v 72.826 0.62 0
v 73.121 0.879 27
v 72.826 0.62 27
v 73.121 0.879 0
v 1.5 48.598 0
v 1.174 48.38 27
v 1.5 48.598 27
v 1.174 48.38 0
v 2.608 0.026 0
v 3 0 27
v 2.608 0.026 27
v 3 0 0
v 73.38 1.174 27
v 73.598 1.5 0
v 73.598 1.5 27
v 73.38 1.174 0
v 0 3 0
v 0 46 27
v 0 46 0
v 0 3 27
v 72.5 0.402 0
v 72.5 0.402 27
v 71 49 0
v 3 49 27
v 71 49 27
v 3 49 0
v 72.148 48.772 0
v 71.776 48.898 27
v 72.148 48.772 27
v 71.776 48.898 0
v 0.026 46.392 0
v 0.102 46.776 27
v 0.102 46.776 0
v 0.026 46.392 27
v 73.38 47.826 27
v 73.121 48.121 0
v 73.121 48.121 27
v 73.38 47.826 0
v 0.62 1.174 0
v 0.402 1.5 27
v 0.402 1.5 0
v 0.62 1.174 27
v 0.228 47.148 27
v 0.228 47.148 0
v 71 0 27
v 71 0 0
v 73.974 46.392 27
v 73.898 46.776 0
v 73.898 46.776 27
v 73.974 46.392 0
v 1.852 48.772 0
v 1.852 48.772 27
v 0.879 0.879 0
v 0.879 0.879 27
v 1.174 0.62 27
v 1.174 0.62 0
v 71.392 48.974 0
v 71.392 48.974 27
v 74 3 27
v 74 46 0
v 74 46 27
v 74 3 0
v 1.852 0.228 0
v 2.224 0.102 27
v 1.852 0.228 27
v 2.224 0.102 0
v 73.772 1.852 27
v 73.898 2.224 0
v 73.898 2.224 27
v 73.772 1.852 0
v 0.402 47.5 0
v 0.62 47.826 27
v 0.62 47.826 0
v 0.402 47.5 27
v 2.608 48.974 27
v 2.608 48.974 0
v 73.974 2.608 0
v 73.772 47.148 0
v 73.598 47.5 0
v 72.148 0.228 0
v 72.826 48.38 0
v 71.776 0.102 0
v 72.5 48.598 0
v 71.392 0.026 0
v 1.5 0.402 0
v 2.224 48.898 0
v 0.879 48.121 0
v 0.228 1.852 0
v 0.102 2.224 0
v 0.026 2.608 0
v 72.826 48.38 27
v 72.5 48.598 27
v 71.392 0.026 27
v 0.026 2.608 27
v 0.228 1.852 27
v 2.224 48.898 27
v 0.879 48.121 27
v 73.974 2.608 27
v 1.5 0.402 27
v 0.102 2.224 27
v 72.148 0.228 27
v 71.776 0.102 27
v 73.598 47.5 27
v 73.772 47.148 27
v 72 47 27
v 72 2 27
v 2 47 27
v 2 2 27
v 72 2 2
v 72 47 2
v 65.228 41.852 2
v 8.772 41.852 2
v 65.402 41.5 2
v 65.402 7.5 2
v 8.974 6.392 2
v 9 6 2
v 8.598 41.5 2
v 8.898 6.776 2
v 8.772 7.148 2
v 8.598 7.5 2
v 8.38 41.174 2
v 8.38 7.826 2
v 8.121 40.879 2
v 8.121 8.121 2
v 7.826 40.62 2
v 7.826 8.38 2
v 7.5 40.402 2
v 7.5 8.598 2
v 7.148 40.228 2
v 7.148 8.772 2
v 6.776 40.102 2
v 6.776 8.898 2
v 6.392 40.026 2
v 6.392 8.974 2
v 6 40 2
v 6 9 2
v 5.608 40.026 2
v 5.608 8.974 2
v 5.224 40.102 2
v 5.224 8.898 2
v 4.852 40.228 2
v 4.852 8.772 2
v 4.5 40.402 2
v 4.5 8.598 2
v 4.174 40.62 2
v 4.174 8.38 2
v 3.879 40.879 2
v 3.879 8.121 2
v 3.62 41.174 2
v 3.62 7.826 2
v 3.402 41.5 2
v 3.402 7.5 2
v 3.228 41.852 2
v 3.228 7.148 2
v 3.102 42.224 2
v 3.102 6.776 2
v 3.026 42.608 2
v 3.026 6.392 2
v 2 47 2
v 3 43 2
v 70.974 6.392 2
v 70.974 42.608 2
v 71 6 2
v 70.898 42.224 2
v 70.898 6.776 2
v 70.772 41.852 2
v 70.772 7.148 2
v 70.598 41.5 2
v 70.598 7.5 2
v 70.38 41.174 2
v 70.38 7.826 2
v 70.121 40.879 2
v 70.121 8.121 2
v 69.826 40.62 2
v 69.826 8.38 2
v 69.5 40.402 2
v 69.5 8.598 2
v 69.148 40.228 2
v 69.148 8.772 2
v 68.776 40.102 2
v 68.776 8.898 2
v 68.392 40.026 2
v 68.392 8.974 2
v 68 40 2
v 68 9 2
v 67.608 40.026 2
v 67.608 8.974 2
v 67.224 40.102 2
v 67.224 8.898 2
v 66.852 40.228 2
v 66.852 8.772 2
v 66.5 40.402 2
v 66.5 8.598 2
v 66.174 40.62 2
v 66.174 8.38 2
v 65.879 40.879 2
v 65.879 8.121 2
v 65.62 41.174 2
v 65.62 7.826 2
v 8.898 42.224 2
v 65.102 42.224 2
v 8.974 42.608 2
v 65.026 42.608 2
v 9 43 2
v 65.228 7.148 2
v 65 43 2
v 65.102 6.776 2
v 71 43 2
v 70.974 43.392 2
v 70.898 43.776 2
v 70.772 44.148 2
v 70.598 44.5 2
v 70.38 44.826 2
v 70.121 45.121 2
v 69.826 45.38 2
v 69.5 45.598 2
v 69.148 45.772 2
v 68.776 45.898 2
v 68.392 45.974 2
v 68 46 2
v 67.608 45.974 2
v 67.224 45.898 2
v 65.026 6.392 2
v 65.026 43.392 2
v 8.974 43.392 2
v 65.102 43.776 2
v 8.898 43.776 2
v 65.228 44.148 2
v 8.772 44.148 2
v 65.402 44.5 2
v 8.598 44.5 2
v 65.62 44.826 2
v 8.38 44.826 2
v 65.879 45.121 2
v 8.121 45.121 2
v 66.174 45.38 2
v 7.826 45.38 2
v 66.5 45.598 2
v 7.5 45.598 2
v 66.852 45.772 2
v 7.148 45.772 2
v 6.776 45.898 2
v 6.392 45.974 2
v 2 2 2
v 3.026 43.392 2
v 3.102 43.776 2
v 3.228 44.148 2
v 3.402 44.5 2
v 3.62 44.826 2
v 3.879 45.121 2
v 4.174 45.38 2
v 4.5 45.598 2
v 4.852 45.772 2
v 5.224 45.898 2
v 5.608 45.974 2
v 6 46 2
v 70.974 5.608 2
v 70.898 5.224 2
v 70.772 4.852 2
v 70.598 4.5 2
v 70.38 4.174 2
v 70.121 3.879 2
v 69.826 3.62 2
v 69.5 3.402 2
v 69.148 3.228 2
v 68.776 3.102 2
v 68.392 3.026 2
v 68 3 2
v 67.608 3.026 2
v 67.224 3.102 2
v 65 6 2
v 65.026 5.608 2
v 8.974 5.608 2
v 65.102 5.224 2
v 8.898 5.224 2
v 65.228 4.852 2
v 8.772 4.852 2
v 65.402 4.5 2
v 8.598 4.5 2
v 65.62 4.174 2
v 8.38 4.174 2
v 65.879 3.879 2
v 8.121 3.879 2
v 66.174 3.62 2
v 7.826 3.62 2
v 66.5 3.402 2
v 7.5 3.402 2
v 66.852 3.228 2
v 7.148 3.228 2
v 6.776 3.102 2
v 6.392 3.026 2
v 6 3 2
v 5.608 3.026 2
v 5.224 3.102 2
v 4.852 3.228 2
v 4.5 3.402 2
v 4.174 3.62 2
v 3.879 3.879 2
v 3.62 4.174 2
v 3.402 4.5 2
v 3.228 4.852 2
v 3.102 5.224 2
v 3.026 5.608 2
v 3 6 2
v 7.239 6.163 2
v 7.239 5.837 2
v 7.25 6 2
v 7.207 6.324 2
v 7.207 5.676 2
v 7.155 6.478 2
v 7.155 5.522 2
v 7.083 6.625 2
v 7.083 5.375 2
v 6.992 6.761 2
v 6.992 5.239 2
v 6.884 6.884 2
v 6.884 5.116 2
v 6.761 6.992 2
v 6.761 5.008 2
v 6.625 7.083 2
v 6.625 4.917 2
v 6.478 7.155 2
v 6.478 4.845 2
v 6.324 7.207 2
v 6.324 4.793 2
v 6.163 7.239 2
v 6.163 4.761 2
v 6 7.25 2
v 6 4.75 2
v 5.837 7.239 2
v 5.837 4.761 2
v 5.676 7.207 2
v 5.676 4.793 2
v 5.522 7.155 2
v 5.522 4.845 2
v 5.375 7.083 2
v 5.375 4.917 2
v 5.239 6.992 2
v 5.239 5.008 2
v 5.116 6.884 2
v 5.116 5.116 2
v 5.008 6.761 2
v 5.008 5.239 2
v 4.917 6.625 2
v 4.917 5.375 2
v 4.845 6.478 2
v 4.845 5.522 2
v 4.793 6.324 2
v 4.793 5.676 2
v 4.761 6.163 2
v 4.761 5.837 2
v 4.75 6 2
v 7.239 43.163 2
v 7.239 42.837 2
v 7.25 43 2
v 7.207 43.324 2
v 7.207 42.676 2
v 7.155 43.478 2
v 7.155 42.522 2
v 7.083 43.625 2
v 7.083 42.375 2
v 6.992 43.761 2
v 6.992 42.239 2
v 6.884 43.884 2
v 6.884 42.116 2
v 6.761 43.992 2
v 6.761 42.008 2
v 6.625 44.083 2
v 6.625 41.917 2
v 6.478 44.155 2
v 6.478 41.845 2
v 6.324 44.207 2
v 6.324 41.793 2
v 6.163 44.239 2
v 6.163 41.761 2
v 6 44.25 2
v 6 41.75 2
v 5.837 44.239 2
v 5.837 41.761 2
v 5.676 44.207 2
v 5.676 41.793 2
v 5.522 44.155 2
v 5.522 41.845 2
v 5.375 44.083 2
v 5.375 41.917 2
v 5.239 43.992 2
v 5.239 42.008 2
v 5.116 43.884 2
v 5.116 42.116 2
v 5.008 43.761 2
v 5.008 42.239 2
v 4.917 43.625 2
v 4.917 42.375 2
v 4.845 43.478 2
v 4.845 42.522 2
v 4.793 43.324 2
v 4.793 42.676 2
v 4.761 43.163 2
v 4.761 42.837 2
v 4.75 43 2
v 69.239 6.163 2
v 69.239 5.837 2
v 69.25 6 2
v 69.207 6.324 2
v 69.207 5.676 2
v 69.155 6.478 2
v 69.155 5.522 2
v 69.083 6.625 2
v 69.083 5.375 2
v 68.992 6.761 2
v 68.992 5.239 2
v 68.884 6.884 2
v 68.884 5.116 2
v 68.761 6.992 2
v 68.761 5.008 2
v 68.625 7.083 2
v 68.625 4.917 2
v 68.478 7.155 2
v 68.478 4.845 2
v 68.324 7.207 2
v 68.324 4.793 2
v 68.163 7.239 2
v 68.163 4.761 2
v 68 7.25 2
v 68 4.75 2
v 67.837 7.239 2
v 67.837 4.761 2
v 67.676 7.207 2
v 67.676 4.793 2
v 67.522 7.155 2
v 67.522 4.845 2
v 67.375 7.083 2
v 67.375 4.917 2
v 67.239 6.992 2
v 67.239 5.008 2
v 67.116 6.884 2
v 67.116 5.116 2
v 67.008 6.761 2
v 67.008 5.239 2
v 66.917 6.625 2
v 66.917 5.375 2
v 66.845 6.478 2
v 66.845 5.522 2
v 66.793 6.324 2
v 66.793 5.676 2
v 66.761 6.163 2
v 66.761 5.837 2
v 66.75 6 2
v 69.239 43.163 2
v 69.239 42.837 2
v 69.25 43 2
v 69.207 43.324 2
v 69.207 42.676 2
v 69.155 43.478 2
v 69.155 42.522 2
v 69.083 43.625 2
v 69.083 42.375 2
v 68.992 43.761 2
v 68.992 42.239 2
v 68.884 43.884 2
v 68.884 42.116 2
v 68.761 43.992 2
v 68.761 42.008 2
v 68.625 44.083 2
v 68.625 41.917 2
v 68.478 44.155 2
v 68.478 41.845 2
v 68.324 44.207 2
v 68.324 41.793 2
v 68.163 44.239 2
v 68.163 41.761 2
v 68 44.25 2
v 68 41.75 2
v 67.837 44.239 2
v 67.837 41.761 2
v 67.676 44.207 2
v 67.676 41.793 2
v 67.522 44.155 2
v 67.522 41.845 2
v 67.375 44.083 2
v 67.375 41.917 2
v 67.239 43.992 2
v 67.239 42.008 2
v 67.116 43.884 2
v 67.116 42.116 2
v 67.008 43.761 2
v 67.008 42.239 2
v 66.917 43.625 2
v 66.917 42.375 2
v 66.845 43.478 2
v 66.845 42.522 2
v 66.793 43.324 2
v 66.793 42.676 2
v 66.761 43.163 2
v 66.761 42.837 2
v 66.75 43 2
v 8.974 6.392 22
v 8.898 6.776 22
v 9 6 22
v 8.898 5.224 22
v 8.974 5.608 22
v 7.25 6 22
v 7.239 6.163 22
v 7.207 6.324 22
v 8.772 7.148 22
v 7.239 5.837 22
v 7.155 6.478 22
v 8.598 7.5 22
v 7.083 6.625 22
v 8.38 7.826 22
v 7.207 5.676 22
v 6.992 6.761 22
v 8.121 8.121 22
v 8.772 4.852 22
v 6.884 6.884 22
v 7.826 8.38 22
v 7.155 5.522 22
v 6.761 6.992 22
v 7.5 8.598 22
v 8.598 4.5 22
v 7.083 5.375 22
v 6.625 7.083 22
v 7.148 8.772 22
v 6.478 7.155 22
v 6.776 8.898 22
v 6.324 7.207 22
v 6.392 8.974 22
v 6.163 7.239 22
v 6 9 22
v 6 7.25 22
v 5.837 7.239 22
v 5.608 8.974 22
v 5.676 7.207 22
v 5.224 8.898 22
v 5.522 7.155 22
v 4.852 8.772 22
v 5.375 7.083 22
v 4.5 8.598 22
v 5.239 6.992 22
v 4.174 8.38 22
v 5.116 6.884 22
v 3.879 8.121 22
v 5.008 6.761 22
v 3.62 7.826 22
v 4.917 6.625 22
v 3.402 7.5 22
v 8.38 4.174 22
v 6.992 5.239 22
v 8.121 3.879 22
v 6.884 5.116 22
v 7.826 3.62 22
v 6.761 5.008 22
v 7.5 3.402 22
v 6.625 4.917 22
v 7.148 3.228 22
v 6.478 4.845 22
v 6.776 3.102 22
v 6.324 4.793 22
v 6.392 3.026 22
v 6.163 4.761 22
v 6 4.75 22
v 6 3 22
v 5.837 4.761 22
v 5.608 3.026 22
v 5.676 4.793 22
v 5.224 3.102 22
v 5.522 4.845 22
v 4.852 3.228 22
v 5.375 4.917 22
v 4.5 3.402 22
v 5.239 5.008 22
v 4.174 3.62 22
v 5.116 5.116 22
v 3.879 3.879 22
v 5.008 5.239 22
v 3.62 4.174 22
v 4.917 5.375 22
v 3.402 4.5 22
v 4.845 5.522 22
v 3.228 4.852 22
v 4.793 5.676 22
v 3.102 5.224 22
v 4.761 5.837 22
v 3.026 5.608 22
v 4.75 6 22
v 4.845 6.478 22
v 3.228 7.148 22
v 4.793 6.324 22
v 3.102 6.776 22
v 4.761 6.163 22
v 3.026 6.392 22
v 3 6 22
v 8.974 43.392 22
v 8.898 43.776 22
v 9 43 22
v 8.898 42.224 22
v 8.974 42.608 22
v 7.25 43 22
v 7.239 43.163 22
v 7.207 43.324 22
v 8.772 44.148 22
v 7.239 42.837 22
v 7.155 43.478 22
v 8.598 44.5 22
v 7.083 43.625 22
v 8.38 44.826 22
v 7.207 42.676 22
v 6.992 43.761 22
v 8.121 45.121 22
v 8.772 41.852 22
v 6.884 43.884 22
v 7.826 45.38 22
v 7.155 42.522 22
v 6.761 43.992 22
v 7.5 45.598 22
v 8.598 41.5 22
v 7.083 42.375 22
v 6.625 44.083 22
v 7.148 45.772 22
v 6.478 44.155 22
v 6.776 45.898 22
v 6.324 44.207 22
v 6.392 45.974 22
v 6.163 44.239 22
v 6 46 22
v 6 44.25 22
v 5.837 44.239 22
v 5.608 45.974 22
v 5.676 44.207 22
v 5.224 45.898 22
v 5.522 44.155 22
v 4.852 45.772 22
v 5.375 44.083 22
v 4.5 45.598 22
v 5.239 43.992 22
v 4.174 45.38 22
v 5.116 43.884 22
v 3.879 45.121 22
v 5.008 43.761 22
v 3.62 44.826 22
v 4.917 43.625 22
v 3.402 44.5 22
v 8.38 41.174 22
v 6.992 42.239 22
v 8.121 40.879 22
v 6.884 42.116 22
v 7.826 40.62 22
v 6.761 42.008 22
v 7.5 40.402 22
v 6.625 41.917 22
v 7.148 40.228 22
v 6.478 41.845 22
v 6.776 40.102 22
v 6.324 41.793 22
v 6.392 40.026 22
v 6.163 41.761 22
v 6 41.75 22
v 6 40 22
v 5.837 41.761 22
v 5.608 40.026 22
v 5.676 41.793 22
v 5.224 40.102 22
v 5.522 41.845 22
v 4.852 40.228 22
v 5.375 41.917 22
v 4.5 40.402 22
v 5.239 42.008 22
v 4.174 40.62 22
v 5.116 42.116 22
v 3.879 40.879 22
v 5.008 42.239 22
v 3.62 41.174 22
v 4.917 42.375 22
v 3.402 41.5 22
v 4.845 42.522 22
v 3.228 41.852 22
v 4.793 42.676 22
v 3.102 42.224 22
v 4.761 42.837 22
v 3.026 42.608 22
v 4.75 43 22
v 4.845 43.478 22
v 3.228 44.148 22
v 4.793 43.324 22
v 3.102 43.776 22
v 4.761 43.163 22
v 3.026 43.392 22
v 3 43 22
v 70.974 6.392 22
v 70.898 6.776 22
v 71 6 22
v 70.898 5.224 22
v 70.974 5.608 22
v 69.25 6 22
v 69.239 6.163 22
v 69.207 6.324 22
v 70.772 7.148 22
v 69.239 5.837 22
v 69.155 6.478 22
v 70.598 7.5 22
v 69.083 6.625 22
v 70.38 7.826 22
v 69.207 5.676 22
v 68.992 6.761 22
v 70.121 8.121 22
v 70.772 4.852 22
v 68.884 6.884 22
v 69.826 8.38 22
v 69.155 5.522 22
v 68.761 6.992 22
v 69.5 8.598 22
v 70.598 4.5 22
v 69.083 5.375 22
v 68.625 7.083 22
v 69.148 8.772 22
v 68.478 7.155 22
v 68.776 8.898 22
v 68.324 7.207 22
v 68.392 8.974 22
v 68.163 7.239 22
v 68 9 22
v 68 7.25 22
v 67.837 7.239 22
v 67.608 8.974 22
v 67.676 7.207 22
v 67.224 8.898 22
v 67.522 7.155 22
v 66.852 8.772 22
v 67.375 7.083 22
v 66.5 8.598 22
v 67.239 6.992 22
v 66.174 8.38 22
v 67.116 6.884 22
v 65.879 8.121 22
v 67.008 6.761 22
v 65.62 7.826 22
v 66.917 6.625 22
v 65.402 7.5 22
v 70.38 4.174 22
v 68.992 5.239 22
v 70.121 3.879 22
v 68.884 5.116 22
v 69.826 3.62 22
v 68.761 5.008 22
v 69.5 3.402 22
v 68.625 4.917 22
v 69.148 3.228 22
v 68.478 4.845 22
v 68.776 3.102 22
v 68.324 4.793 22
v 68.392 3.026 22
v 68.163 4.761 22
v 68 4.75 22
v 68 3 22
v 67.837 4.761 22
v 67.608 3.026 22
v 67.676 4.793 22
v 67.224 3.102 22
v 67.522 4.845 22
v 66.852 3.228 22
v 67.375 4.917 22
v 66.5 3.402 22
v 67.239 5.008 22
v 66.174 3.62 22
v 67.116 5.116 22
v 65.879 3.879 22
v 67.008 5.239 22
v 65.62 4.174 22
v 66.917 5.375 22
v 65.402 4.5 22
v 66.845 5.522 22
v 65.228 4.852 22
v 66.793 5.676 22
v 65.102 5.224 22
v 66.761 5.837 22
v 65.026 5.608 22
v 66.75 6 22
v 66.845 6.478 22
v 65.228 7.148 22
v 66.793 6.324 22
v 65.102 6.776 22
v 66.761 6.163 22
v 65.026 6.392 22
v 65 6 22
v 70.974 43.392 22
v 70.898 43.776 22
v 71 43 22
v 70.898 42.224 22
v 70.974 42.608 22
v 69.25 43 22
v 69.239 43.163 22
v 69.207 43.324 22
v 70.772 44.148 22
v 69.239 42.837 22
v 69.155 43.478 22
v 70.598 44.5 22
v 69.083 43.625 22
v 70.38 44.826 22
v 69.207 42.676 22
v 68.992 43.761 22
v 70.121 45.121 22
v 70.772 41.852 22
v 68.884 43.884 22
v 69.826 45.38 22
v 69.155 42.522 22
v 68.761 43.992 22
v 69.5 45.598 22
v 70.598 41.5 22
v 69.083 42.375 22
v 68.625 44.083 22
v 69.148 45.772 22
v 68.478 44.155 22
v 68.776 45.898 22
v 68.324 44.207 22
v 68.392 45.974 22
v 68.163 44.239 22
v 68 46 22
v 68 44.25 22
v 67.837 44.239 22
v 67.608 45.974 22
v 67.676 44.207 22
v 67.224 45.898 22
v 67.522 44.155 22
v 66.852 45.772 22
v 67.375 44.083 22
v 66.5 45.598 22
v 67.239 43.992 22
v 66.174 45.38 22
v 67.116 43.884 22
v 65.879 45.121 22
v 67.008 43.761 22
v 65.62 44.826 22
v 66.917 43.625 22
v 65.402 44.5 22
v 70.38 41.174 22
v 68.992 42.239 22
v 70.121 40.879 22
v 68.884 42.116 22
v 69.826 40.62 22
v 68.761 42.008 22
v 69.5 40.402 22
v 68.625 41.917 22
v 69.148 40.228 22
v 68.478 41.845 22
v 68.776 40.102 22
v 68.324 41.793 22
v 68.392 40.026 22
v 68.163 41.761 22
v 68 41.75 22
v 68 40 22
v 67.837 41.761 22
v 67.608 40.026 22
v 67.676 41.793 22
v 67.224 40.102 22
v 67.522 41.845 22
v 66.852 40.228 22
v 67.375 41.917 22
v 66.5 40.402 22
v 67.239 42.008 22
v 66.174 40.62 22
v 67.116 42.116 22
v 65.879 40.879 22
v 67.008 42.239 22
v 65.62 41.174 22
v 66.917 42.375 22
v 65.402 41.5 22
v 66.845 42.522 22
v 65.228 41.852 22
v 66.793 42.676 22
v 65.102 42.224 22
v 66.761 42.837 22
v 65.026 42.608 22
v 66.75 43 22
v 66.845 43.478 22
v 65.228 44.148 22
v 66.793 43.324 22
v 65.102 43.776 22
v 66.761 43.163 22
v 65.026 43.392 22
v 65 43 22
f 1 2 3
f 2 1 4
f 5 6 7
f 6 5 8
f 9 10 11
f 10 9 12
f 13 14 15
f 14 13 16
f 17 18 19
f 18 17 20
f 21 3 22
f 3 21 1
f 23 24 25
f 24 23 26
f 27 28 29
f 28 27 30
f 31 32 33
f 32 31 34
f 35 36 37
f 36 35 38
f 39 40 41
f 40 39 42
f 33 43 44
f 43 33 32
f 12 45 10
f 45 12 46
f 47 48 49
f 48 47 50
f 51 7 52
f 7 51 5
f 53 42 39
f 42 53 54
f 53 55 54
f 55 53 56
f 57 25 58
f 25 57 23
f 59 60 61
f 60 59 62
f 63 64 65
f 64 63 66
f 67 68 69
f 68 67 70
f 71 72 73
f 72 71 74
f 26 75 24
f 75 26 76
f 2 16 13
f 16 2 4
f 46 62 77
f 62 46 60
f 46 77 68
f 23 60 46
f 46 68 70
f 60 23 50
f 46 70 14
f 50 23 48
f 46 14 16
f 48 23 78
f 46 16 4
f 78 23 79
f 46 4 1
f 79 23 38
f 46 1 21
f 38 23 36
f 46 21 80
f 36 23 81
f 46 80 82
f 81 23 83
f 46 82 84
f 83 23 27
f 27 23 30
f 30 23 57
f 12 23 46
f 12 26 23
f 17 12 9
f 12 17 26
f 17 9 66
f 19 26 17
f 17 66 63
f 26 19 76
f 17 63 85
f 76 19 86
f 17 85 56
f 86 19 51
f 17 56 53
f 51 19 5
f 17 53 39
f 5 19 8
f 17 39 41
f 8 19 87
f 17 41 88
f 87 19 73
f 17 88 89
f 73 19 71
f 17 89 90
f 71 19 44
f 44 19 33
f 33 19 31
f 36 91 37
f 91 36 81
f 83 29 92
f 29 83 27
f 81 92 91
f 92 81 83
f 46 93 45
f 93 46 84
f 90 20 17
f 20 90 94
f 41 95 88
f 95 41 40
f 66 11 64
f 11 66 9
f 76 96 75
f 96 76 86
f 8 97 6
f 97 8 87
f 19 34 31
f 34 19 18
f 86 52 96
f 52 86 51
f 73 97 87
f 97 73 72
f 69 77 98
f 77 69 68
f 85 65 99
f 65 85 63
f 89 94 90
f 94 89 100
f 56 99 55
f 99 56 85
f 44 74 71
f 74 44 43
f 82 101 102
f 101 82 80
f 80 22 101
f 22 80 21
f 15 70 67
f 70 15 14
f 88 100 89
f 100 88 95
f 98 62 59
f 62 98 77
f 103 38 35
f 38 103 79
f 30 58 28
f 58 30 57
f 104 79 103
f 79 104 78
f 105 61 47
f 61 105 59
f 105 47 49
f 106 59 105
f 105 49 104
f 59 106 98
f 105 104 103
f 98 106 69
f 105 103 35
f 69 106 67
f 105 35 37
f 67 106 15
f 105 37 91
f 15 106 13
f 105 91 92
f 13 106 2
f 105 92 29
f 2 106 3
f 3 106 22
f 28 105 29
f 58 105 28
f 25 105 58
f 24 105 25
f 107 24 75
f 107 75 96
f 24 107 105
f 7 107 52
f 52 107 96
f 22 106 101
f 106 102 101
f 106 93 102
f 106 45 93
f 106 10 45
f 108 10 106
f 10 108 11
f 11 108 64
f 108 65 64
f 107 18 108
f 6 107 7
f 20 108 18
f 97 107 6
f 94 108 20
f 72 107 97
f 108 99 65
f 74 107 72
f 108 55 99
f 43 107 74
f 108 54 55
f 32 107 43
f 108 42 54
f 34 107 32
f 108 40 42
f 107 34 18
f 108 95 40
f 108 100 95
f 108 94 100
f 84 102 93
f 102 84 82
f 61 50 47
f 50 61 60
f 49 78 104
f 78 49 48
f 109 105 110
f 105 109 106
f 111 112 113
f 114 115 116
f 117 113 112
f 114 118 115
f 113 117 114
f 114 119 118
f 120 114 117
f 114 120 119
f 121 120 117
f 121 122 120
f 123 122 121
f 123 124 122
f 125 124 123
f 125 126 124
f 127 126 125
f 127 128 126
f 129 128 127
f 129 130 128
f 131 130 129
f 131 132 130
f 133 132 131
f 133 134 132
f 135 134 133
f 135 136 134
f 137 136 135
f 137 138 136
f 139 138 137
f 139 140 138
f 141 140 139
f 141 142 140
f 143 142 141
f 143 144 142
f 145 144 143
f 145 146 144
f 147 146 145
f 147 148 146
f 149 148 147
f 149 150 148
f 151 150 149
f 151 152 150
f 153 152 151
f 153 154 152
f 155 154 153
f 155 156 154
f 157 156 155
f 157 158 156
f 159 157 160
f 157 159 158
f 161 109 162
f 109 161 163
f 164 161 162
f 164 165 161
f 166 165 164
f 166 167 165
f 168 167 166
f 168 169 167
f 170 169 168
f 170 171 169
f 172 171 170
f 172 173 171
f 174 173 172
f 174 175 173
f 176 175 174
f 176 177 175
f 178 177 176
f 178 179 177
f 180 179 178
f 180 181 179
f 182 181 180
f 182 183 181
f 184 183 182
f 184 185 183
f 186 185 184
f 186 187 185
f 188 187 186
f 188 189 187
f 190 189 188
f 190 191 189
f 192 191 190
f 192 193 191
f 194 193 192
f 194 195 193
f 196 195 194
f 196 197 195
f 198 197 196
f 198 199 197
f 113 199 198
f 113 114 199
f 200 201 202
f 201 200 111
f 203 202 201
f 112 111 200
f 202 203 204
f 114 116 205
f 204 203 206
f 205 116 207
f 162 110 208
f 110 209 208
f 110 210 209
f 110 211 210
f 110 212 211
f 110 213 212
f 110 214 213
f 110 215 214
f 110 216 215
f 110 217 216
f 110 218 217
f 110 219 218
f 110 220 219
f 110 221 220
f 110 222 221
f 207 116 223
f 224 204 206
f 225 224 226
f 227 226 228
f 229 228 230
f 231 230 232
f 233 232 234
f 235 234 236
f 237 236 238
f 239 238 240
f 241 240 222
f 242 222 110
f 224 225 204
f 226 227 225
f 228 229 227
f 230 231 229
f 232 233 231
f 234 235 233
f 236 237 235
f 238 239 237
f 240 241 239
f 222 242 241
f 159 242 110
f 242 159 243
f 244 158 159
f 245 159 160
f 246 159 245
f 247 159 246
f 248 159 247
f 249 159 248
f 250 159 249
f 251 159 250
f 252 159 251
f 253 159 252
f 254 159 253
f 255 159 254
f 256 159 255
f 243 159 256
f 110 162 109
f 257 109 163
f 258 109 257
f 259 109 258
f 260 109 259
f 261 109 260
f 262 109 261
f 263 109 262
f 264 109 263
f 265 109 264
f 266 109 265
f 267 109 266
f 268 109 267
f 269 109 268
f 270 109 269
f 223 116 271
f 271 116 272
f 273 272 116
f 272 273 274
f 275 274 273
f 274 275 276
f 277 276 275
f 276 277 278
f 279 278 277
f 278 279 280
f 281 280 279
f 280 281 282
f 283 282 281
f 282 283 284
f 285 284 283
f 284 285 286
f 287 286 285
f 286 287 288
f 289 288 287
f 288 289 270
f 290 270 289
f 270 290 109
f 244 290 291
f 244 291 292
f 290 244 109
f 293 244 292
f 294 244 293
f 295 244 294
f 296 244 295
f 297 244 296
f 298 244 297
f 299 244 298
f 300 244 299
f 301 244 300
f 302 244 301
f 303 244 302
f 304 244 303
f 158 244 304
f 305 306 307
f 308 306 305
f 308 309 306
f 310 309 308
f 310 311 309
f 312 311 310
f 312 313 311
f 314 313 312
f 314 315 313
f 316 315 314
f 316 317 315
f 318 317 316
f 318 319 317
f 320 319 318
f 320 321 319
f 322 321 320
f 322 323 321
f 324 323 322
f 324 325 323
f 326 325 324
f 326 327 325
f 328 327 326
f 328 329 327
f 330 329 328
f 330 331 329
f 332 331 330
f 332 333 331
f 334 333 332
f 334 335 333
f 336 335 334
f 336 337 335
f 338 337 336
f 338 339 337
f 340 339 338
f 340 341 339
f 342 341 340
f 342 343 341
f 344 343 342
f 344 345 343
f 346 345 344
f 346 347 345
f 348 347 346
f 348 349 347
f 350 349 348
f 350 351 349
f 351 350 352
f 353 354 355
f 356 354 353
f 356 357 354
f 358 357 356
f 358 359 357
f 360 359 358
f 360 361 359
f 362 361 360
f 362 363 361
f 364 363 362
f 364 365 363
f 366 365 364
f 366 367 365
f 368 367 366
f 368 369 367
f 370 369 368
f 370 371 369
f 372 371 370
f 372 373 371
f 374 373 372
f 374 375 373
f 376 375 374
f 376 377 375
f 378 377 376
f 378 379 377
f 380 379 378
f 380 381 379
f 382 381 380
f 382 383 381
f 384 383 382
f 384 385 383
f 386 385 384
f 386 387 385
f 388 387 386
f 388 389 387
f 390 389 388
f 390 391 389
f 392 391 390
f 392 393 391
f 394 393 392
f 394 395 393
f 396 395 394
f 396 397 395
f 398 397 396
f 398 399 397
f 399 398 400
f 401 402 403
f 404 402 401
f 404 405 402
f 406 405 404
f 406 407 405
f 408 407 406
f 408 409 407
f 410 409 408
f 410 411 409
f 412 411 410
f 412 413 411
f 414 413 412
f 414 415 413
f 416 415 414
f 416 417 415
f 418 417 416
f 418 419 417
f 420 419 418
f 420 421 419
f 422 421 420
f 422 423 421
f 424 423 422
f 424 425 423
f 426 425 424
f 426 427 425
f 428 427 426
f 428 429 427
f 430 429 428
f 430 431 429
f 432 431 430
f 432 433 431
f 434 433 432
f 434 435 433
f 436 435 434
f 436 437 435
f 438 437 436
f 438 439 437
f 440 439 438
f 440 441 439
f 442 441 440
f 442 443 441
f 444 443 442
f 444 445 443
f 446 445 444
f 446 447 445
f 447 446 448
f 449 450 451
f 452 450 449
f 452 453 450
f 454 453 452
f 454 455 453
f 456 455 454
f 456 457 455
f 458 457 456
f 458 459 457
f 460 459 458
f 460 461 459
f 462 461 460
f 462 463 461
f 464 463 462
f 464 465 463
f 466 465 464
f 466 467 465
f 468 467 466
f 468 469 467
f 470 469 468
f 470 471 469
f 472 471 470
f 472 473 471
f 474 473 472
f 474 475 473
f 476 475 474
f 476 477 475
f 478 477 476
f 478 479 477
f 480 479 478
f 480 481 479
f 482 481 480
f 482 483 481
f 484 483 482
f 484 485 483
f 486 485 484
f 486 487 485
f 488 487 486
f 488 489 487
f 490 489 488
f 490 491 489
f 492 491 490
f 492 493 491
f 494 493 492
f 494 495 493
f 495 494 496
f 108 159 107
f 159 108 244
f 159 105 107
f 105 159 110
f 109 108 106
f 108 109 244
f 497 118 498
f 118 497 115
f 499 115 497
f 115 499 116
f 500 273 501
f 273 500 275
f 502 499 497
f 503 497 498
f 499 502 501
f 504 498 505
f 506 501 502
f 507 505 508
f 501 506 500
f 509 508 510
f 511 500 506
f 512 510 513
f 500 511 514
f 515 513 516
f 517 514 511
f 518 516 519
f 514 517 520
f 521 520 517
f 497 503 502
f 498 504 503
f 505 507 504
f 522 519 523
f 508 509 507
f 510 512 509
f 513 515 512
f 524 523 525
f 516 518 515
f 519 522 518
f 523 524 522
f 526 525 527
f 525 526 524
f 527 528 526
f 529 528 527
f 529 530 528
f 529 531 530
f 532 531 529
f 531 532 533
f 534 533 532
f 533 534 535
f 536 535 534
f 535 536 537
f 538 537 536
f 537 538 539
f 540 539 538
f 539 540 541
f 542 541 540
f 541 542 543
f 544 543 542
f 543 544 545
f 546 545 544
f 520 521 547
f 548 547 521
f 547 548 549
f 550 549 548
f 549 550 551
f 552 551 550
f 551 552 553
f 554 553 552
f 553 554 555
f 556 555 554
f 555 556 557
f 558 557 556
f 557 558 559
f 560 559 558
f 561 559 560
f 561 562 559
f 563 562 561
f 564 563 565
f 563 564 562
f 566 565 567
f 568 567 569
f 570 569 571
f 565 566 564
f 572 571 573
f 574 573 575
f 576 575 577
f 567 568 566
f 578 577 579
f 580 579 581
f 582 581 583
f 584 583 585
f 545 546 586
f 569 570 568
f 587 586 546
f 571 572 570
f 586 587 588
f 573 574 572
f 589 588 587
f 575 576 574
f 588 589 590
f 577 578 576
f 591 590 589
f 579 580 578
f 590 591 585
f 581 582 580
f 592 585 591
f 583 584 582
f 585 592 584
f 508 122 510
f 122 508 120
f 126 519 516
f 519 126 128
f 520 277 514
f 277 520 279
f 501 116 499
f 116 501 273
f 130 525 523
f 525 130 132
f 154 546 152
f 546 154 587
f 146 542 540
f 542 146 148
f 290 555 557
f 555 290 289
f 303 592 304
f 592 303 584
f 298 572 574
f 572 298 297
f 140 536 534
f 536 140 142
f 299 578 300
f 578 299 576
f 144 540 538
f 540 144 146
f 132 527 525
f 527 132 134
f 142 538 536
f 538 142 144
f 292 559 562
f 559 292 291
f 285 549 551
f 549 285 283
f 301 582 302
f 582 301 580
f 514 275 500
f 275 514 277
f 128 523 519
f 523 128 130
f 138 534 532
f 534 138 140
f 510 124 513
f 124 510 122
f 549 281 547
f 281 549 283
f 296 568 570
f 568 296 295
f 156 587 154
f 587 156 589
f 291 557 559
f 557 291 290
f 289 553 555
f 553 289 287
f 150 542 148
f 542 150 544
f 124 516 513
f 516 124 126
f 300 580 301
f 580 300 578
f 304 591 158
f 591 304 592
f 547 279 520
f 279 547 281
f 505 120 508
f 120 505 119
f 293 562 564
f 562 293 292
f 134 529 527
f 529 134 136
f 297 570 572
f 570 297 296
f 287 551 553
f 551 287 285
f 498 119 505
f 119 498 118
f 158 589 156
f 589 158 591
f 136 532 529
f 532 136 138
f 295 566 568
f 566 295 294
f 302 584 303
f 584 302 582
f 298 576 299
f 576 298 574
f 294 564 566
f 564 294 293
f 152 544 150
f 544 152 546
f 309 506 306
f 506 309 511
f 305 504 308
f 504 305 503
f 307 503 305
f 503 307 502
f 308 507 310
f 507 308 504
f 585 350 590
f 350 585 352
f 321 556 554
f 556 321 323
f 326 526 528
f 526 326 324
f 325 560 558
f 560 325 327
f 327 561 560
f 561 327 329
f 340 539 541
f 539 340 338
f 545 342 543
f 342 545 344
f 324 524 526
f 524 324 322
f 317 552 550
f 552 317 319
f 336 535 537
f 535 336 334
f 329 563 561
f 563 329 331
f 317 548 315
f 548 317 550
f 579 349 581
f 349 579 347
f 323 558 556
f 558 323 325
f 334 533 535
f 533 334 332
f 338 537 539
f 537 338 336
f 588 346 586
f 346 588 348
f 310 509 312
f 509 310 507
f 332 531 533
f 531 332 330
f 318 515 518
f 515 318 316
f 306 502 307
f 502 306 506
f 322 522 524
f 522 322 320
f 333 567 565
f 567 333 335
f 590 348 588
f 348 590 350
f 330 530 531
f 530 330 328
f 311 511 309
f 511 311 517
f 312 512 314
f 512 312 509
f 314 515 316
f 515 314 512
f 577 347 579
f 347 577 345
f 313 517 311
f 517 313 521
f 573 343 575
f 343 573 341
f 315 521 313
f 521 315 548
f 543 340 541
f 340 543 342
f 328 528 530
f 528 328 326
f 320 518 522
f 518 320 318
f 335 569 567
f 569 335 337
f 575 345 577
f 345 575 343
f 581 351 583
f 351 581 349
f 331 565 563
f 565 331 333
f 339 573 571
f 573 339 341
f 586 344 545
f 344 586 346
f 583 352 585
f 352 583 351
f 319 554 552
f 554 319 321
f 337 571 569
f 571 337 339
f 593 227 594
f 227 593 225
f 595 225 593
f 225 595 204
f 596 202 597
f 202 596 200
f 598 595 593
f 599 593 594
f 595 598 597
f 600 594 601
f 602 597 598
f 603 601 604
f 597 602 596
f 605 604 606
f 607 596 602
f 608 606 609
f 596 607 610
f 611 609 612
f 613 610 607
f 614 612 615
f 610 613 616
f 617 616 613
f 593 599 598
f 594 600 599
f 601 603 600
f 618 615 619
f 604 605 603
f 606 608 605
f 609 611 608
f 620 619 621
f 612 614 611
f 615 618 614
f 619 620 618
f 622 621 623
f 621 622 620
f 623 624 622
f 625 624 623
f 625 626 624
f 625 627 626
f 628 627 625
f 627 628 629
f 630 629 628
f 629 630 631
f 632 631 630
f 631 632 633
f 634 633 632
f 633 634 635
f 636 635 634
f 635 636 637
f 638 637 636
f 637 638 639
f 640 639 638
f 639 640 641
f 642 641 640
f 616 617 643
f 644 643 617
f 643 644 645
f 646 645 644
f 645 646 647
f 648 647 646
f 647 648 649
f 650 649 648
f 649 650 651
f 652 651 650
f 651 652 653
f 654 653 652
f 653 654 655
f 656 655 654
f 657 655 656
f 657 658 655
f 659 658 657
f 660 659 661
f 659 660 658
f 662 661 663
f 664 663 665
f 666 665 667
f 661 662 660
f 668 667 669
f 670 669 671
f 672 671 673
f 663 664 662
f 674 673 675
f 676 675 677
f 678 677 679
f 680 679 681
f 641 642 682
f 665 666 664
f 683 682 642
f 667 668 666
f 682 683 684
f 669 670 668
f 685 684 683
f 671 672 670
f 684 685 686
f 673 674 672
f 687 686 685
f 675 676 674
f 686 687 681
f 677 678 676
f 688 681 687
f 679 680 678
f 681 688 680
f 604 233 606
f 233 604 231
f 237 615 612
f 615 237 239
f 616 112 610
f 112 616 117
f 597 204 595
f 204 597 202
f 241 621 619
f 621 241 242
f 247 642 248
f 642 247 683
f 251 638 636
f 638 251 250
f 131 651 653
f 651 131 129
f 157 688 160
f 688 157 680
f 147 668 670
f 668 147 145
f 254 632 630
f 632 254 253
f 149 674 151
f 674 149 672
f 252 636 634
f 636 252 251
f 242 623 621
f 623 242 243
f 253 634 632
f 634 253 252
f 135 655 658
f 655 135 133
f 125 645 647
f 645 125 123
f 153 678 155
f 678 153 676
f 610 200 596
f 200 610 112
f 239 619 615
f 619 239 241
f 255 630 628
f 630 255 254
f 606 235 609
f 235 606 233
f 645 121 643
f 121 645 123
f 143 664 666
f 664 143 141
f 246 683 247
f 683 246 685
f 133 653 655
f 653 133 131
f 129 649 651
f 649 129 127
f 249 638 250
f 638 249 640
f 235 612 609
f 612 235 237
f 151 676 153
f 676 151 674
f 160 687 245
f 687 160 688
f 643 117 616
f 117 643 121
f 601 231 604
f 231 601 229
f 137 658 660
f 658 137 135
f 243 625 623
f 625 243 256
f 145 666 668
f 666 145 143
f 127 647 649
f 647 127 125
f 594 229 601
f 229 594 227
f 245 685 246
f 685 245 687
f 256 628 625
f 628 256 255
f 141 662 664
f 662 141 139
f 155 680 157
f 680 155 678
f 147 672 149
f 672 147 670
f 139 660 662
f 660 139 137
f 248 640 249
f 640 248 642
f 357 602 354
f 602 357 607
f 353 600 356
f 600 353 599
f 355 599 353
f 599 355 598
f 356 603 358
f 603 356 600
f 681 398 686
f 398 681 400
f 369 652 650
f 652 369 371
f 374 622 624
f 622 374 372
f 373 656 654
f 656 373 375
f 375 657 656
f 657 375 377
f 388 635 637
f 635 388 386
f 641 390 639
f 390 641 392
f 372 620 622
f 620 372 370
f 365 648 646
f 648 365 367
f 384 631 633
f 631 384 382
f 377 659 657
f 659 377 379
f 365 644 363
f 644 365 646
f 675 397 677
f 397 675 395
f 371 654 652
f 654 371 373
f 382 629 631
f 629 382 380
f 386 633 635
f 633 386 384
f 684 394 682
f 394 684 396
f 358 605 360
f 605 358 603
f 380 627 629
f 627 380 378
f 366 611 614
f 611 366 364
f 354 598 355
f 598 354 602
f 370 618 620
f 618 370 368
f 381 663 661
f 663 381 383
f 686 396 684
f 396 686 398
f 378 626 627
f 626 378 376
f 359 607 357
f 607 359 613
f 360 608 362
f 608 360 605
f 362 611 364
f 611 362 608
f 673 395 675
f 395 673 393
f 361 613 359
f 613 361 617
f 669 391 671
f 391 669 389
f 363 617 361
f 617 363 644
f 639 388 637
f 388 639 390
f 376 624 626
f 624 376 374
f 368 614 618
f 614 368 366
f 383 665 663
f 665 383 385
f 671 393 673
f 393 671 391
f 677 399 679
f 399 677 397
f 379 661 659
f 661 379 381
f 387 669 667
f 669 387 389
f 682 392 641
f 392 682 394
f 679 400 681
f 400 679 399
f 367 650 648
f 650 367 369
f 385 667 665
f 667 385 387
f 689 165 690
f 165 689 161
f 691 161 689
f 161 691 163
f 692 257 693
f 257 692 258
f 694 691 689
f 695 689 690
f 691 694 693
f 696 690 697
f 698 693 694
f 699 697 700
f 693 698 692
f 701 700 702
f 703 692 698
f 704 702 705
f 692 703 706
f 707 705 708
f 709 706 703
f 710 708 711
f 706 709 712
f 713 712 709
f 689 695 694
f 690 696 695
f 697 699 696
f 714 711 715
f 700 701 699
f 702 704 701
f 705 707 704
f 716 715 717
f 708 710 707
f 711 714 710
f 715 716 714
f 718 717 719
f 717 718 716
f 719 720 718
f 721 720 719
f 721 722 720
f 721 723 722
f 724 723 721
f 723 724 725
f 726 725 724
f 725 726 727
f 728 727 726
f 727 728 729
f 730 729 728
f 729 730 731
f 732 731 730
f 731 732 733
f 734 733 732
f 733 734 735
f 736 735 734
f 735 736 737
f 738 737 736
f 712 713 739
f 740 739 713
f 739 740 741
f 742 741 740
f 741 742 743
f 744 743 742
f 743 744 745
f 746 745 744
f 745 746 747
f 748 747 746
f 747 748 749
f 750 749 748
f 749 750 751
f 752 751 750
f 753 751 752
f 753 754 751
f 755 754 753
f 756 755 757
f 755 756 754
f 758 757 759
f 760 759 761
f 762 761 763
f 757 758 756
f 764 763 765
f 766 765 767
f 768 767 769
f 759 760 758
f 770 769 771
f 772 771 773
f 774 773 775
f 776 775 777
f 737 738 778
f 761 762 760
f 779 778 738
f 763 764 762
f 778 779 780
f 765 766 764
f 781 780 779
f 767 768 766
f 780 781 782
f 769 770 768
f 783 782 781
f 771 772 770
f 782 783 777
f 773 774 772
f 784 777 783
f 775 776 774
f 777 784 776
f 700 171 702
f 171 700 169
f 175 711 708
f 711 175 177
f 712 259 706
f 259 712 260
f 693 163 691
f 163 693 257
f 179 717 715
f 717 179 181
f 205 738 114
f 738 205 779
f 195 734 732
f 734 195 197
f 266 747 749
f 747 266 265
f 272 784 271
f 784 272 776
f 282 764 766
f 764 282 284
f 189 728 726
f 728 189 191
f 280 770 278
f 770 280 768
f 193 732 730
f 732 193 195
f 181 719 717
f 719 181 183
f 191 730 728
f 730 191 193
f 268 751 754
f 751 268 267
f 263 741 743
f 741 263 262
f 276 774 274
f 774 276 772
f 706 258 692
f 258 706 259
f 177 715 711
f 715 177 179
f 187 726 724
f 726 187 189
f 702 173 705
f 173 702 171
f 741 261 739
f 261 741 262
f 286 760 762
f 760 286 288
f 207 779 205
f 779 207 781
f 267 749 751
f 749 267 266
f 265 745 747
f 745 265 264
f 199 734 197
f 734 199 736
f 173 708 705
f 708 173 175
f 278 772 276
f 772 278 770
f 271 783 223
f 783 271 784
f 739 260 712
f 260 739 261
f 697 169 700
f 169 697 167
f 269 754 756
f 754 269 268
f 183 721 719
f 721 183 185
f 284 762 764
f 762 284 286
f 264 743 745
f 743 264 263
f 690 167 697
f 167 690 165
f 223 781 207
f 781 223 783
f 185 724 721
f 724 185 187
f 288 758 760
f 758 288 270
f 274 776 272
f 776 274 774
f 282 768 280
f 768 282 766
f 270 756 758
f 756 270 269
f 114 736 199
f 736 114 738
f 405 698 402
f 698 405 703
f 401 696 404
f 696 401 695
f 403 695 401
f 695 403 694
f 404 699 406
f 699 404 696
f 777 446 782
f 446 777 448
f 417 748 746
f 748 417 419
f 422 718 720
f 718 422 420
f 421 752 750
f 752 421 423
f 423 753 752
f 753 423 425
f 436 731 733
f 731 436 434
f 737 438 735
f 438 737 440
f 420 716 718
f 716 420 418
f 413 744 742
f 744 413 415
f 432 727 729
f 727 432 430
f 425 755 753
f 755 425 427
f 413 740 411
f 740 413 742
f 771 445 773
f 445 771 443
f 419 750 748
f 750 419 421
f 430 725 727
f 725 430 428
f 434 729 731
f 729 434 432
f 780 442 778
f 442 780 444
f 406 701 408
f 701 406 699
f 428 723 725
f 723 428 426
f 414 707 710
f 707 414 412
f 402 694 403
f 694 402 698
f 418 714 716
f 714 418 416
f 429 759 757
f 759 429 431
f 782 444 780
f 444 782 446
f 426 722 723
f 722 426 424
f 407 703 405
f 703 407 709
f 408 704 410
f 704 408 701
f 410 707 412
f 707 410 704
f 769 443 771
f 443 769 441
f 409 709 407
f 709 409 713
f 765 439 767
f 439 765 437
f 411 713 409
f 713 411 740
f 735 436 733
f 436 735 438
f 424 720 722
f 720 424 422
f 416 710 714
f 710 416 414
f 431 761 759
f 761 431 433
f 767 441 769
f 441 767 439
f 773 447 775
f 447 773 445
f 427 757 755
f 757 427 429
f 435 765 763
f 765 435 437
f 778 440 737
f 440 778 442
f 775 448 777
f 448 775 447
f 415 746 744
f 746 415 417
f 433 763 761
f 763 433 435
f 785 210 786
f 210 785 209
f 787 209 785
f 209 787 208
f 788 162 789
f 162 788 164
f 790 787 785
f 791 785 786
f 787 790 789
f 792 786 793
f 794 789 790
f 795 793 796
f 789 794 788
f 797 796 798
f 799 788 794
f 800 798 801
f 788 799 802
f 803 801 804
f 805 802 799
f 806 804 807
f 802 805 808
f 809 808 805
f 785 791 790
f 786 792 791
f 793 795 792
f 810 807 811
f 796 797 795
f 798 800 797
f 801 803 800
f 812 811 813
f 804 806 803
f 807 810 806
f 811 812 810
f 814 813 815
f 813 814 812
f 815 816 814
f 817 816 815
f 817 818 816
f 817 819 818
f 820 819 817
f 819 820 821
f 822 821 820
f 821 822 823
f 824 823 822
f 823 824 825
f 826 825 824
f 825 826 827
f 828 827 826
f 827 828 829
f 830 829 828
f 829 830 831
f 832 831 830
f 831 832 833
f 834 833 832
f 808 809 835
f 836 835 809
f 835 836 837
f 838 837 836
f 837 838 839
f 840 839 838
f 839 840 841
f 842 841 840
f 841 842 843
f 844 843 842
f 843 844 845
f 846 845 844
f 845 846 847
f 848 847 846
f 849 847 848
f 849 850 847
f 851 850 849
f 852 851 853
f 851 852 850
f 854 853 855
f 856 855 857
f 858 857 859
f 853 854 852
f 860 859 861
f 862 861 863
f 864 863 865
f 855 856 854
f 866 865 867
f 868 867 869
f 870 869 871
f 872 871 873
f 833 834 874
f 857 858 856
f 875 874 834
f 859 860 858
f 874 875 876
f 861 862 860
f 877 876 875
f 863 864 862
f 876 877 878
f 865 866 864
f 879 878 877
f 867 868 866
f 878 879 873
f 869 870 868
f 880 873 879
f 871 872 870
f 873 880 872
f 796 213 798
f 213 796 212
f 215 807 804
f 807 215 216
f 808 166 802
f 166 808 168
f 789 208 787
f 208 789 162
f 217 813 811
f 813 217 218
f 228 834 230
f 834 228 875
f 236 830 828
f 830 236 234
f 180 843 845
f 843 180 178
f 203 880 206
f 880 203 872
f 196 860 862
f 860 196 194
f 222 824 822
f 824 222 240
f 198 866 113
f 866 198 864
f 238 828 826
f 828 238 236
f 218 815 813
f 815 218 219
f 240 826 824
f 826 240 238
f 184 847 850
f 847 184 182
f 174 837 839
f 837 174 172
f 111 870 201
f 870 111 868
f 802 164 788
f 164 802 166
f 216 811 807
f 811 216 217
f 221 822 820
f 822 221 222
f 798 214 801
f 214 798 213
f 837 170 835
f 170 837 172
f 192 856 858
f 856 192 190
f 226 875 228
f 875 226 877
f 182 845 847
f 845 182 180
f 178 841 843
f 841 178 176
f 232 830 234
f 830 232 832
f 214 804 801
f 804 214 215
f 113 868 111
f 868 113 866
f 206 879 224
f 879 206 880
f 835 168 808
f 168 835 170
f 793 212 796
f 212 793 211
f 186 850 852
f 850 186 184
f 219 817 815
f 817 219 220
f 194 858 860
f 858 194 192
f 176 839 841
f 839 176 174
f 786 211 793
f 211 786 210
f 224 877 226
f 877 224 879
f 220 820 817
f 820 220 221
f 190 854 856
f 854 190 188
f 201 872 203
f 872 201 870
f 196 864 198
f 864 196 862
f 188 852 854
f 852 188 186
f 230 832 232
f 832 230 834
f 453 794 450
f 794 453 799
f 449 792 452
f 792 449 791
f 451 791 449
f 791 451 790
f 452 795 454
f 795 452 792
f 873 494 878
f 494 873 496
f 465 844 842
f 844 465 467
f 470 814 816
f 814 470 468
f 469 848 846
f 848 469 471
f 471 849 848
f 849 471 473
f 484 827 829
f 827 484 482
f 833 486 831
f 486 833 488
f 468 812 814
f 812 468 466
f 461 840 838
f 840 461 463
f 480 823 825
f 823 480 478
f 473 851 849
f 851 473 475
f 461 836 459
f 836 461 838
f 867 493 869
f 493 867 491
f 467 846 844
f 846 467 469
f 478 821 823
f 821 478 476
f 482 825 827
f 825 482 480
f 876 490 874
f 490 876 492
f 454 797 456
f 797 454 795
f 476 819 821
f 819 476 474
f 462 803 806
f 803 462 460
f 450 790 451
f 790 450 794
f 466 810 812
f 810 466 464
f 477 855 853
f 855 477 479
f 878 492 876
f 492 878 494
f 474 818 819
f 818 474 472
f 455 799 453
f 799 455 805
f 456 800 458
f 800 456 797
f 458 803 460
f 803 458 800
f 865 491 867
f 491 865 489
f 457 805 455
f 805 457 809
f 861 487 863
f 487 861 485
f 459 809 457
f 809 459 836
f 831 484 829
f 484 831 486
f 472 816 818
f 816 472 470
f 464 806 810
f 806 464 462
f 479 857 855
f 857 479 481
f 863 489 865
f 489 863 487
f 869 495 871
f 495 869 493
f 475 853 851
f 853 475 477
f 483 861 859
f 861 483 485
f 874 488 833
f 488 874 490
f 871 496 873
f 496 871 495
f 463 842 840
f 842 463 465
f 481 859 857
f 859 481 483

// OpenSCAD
// Parametric electronics enclosure with screw posts and a snap lid
/* [Inside dimensions] */
inner_x = 70;   // [20:200]
inner_y = 45;   // [20:200]
inner_z = 25;   // [10:100]
/* [Walls] */
wall = 2;       // [1:0.2:5]
floor_t = 2;    // [1:0.2:5]
corner_r = 3;   // [0:0.5:10]
/* [Screw posts] */
post_d = 6;     // [4:0.5:12]
screw_d = 2.5;  // [1.5:0.1:5]
post_inset = 4; // [3:15]
/* [Hidden] */
$fn = 48;
eps = 0.01;

outer = [inner_x + 2 * wall, inner_y + 2 * wall, inner_z + floor_t];

module rounded_box(size, r) {
  hull()
    for (x = [r, size[0] - r], y = [r, size[1] - r])
      translate([x, y, 0]) cylinder(r = r, h = size[2]);
}

module post_positions() {
  for (x = [wall + post_inset, outer[0] - wall - post_inset])
    for (y = [wall + post_inset, outer[1] - wall - post_inset])
      translate([x, y, 0]) children();
}

module enclosure() {
  difference() {
    rounded_box(outer, corner_r);
    translate([wall, wall, floor_t]) cube([inner_x, inner_y, inner_z + eps]);
  }
  post_positions()
    difference() {
      cylinder(d = post_d, h = inner_z * 0.8 + floor_t);
      translate([0, 0, floor_t]) cylinder(d = screw_d, h = inner_z);
    }
}

enclosure();
